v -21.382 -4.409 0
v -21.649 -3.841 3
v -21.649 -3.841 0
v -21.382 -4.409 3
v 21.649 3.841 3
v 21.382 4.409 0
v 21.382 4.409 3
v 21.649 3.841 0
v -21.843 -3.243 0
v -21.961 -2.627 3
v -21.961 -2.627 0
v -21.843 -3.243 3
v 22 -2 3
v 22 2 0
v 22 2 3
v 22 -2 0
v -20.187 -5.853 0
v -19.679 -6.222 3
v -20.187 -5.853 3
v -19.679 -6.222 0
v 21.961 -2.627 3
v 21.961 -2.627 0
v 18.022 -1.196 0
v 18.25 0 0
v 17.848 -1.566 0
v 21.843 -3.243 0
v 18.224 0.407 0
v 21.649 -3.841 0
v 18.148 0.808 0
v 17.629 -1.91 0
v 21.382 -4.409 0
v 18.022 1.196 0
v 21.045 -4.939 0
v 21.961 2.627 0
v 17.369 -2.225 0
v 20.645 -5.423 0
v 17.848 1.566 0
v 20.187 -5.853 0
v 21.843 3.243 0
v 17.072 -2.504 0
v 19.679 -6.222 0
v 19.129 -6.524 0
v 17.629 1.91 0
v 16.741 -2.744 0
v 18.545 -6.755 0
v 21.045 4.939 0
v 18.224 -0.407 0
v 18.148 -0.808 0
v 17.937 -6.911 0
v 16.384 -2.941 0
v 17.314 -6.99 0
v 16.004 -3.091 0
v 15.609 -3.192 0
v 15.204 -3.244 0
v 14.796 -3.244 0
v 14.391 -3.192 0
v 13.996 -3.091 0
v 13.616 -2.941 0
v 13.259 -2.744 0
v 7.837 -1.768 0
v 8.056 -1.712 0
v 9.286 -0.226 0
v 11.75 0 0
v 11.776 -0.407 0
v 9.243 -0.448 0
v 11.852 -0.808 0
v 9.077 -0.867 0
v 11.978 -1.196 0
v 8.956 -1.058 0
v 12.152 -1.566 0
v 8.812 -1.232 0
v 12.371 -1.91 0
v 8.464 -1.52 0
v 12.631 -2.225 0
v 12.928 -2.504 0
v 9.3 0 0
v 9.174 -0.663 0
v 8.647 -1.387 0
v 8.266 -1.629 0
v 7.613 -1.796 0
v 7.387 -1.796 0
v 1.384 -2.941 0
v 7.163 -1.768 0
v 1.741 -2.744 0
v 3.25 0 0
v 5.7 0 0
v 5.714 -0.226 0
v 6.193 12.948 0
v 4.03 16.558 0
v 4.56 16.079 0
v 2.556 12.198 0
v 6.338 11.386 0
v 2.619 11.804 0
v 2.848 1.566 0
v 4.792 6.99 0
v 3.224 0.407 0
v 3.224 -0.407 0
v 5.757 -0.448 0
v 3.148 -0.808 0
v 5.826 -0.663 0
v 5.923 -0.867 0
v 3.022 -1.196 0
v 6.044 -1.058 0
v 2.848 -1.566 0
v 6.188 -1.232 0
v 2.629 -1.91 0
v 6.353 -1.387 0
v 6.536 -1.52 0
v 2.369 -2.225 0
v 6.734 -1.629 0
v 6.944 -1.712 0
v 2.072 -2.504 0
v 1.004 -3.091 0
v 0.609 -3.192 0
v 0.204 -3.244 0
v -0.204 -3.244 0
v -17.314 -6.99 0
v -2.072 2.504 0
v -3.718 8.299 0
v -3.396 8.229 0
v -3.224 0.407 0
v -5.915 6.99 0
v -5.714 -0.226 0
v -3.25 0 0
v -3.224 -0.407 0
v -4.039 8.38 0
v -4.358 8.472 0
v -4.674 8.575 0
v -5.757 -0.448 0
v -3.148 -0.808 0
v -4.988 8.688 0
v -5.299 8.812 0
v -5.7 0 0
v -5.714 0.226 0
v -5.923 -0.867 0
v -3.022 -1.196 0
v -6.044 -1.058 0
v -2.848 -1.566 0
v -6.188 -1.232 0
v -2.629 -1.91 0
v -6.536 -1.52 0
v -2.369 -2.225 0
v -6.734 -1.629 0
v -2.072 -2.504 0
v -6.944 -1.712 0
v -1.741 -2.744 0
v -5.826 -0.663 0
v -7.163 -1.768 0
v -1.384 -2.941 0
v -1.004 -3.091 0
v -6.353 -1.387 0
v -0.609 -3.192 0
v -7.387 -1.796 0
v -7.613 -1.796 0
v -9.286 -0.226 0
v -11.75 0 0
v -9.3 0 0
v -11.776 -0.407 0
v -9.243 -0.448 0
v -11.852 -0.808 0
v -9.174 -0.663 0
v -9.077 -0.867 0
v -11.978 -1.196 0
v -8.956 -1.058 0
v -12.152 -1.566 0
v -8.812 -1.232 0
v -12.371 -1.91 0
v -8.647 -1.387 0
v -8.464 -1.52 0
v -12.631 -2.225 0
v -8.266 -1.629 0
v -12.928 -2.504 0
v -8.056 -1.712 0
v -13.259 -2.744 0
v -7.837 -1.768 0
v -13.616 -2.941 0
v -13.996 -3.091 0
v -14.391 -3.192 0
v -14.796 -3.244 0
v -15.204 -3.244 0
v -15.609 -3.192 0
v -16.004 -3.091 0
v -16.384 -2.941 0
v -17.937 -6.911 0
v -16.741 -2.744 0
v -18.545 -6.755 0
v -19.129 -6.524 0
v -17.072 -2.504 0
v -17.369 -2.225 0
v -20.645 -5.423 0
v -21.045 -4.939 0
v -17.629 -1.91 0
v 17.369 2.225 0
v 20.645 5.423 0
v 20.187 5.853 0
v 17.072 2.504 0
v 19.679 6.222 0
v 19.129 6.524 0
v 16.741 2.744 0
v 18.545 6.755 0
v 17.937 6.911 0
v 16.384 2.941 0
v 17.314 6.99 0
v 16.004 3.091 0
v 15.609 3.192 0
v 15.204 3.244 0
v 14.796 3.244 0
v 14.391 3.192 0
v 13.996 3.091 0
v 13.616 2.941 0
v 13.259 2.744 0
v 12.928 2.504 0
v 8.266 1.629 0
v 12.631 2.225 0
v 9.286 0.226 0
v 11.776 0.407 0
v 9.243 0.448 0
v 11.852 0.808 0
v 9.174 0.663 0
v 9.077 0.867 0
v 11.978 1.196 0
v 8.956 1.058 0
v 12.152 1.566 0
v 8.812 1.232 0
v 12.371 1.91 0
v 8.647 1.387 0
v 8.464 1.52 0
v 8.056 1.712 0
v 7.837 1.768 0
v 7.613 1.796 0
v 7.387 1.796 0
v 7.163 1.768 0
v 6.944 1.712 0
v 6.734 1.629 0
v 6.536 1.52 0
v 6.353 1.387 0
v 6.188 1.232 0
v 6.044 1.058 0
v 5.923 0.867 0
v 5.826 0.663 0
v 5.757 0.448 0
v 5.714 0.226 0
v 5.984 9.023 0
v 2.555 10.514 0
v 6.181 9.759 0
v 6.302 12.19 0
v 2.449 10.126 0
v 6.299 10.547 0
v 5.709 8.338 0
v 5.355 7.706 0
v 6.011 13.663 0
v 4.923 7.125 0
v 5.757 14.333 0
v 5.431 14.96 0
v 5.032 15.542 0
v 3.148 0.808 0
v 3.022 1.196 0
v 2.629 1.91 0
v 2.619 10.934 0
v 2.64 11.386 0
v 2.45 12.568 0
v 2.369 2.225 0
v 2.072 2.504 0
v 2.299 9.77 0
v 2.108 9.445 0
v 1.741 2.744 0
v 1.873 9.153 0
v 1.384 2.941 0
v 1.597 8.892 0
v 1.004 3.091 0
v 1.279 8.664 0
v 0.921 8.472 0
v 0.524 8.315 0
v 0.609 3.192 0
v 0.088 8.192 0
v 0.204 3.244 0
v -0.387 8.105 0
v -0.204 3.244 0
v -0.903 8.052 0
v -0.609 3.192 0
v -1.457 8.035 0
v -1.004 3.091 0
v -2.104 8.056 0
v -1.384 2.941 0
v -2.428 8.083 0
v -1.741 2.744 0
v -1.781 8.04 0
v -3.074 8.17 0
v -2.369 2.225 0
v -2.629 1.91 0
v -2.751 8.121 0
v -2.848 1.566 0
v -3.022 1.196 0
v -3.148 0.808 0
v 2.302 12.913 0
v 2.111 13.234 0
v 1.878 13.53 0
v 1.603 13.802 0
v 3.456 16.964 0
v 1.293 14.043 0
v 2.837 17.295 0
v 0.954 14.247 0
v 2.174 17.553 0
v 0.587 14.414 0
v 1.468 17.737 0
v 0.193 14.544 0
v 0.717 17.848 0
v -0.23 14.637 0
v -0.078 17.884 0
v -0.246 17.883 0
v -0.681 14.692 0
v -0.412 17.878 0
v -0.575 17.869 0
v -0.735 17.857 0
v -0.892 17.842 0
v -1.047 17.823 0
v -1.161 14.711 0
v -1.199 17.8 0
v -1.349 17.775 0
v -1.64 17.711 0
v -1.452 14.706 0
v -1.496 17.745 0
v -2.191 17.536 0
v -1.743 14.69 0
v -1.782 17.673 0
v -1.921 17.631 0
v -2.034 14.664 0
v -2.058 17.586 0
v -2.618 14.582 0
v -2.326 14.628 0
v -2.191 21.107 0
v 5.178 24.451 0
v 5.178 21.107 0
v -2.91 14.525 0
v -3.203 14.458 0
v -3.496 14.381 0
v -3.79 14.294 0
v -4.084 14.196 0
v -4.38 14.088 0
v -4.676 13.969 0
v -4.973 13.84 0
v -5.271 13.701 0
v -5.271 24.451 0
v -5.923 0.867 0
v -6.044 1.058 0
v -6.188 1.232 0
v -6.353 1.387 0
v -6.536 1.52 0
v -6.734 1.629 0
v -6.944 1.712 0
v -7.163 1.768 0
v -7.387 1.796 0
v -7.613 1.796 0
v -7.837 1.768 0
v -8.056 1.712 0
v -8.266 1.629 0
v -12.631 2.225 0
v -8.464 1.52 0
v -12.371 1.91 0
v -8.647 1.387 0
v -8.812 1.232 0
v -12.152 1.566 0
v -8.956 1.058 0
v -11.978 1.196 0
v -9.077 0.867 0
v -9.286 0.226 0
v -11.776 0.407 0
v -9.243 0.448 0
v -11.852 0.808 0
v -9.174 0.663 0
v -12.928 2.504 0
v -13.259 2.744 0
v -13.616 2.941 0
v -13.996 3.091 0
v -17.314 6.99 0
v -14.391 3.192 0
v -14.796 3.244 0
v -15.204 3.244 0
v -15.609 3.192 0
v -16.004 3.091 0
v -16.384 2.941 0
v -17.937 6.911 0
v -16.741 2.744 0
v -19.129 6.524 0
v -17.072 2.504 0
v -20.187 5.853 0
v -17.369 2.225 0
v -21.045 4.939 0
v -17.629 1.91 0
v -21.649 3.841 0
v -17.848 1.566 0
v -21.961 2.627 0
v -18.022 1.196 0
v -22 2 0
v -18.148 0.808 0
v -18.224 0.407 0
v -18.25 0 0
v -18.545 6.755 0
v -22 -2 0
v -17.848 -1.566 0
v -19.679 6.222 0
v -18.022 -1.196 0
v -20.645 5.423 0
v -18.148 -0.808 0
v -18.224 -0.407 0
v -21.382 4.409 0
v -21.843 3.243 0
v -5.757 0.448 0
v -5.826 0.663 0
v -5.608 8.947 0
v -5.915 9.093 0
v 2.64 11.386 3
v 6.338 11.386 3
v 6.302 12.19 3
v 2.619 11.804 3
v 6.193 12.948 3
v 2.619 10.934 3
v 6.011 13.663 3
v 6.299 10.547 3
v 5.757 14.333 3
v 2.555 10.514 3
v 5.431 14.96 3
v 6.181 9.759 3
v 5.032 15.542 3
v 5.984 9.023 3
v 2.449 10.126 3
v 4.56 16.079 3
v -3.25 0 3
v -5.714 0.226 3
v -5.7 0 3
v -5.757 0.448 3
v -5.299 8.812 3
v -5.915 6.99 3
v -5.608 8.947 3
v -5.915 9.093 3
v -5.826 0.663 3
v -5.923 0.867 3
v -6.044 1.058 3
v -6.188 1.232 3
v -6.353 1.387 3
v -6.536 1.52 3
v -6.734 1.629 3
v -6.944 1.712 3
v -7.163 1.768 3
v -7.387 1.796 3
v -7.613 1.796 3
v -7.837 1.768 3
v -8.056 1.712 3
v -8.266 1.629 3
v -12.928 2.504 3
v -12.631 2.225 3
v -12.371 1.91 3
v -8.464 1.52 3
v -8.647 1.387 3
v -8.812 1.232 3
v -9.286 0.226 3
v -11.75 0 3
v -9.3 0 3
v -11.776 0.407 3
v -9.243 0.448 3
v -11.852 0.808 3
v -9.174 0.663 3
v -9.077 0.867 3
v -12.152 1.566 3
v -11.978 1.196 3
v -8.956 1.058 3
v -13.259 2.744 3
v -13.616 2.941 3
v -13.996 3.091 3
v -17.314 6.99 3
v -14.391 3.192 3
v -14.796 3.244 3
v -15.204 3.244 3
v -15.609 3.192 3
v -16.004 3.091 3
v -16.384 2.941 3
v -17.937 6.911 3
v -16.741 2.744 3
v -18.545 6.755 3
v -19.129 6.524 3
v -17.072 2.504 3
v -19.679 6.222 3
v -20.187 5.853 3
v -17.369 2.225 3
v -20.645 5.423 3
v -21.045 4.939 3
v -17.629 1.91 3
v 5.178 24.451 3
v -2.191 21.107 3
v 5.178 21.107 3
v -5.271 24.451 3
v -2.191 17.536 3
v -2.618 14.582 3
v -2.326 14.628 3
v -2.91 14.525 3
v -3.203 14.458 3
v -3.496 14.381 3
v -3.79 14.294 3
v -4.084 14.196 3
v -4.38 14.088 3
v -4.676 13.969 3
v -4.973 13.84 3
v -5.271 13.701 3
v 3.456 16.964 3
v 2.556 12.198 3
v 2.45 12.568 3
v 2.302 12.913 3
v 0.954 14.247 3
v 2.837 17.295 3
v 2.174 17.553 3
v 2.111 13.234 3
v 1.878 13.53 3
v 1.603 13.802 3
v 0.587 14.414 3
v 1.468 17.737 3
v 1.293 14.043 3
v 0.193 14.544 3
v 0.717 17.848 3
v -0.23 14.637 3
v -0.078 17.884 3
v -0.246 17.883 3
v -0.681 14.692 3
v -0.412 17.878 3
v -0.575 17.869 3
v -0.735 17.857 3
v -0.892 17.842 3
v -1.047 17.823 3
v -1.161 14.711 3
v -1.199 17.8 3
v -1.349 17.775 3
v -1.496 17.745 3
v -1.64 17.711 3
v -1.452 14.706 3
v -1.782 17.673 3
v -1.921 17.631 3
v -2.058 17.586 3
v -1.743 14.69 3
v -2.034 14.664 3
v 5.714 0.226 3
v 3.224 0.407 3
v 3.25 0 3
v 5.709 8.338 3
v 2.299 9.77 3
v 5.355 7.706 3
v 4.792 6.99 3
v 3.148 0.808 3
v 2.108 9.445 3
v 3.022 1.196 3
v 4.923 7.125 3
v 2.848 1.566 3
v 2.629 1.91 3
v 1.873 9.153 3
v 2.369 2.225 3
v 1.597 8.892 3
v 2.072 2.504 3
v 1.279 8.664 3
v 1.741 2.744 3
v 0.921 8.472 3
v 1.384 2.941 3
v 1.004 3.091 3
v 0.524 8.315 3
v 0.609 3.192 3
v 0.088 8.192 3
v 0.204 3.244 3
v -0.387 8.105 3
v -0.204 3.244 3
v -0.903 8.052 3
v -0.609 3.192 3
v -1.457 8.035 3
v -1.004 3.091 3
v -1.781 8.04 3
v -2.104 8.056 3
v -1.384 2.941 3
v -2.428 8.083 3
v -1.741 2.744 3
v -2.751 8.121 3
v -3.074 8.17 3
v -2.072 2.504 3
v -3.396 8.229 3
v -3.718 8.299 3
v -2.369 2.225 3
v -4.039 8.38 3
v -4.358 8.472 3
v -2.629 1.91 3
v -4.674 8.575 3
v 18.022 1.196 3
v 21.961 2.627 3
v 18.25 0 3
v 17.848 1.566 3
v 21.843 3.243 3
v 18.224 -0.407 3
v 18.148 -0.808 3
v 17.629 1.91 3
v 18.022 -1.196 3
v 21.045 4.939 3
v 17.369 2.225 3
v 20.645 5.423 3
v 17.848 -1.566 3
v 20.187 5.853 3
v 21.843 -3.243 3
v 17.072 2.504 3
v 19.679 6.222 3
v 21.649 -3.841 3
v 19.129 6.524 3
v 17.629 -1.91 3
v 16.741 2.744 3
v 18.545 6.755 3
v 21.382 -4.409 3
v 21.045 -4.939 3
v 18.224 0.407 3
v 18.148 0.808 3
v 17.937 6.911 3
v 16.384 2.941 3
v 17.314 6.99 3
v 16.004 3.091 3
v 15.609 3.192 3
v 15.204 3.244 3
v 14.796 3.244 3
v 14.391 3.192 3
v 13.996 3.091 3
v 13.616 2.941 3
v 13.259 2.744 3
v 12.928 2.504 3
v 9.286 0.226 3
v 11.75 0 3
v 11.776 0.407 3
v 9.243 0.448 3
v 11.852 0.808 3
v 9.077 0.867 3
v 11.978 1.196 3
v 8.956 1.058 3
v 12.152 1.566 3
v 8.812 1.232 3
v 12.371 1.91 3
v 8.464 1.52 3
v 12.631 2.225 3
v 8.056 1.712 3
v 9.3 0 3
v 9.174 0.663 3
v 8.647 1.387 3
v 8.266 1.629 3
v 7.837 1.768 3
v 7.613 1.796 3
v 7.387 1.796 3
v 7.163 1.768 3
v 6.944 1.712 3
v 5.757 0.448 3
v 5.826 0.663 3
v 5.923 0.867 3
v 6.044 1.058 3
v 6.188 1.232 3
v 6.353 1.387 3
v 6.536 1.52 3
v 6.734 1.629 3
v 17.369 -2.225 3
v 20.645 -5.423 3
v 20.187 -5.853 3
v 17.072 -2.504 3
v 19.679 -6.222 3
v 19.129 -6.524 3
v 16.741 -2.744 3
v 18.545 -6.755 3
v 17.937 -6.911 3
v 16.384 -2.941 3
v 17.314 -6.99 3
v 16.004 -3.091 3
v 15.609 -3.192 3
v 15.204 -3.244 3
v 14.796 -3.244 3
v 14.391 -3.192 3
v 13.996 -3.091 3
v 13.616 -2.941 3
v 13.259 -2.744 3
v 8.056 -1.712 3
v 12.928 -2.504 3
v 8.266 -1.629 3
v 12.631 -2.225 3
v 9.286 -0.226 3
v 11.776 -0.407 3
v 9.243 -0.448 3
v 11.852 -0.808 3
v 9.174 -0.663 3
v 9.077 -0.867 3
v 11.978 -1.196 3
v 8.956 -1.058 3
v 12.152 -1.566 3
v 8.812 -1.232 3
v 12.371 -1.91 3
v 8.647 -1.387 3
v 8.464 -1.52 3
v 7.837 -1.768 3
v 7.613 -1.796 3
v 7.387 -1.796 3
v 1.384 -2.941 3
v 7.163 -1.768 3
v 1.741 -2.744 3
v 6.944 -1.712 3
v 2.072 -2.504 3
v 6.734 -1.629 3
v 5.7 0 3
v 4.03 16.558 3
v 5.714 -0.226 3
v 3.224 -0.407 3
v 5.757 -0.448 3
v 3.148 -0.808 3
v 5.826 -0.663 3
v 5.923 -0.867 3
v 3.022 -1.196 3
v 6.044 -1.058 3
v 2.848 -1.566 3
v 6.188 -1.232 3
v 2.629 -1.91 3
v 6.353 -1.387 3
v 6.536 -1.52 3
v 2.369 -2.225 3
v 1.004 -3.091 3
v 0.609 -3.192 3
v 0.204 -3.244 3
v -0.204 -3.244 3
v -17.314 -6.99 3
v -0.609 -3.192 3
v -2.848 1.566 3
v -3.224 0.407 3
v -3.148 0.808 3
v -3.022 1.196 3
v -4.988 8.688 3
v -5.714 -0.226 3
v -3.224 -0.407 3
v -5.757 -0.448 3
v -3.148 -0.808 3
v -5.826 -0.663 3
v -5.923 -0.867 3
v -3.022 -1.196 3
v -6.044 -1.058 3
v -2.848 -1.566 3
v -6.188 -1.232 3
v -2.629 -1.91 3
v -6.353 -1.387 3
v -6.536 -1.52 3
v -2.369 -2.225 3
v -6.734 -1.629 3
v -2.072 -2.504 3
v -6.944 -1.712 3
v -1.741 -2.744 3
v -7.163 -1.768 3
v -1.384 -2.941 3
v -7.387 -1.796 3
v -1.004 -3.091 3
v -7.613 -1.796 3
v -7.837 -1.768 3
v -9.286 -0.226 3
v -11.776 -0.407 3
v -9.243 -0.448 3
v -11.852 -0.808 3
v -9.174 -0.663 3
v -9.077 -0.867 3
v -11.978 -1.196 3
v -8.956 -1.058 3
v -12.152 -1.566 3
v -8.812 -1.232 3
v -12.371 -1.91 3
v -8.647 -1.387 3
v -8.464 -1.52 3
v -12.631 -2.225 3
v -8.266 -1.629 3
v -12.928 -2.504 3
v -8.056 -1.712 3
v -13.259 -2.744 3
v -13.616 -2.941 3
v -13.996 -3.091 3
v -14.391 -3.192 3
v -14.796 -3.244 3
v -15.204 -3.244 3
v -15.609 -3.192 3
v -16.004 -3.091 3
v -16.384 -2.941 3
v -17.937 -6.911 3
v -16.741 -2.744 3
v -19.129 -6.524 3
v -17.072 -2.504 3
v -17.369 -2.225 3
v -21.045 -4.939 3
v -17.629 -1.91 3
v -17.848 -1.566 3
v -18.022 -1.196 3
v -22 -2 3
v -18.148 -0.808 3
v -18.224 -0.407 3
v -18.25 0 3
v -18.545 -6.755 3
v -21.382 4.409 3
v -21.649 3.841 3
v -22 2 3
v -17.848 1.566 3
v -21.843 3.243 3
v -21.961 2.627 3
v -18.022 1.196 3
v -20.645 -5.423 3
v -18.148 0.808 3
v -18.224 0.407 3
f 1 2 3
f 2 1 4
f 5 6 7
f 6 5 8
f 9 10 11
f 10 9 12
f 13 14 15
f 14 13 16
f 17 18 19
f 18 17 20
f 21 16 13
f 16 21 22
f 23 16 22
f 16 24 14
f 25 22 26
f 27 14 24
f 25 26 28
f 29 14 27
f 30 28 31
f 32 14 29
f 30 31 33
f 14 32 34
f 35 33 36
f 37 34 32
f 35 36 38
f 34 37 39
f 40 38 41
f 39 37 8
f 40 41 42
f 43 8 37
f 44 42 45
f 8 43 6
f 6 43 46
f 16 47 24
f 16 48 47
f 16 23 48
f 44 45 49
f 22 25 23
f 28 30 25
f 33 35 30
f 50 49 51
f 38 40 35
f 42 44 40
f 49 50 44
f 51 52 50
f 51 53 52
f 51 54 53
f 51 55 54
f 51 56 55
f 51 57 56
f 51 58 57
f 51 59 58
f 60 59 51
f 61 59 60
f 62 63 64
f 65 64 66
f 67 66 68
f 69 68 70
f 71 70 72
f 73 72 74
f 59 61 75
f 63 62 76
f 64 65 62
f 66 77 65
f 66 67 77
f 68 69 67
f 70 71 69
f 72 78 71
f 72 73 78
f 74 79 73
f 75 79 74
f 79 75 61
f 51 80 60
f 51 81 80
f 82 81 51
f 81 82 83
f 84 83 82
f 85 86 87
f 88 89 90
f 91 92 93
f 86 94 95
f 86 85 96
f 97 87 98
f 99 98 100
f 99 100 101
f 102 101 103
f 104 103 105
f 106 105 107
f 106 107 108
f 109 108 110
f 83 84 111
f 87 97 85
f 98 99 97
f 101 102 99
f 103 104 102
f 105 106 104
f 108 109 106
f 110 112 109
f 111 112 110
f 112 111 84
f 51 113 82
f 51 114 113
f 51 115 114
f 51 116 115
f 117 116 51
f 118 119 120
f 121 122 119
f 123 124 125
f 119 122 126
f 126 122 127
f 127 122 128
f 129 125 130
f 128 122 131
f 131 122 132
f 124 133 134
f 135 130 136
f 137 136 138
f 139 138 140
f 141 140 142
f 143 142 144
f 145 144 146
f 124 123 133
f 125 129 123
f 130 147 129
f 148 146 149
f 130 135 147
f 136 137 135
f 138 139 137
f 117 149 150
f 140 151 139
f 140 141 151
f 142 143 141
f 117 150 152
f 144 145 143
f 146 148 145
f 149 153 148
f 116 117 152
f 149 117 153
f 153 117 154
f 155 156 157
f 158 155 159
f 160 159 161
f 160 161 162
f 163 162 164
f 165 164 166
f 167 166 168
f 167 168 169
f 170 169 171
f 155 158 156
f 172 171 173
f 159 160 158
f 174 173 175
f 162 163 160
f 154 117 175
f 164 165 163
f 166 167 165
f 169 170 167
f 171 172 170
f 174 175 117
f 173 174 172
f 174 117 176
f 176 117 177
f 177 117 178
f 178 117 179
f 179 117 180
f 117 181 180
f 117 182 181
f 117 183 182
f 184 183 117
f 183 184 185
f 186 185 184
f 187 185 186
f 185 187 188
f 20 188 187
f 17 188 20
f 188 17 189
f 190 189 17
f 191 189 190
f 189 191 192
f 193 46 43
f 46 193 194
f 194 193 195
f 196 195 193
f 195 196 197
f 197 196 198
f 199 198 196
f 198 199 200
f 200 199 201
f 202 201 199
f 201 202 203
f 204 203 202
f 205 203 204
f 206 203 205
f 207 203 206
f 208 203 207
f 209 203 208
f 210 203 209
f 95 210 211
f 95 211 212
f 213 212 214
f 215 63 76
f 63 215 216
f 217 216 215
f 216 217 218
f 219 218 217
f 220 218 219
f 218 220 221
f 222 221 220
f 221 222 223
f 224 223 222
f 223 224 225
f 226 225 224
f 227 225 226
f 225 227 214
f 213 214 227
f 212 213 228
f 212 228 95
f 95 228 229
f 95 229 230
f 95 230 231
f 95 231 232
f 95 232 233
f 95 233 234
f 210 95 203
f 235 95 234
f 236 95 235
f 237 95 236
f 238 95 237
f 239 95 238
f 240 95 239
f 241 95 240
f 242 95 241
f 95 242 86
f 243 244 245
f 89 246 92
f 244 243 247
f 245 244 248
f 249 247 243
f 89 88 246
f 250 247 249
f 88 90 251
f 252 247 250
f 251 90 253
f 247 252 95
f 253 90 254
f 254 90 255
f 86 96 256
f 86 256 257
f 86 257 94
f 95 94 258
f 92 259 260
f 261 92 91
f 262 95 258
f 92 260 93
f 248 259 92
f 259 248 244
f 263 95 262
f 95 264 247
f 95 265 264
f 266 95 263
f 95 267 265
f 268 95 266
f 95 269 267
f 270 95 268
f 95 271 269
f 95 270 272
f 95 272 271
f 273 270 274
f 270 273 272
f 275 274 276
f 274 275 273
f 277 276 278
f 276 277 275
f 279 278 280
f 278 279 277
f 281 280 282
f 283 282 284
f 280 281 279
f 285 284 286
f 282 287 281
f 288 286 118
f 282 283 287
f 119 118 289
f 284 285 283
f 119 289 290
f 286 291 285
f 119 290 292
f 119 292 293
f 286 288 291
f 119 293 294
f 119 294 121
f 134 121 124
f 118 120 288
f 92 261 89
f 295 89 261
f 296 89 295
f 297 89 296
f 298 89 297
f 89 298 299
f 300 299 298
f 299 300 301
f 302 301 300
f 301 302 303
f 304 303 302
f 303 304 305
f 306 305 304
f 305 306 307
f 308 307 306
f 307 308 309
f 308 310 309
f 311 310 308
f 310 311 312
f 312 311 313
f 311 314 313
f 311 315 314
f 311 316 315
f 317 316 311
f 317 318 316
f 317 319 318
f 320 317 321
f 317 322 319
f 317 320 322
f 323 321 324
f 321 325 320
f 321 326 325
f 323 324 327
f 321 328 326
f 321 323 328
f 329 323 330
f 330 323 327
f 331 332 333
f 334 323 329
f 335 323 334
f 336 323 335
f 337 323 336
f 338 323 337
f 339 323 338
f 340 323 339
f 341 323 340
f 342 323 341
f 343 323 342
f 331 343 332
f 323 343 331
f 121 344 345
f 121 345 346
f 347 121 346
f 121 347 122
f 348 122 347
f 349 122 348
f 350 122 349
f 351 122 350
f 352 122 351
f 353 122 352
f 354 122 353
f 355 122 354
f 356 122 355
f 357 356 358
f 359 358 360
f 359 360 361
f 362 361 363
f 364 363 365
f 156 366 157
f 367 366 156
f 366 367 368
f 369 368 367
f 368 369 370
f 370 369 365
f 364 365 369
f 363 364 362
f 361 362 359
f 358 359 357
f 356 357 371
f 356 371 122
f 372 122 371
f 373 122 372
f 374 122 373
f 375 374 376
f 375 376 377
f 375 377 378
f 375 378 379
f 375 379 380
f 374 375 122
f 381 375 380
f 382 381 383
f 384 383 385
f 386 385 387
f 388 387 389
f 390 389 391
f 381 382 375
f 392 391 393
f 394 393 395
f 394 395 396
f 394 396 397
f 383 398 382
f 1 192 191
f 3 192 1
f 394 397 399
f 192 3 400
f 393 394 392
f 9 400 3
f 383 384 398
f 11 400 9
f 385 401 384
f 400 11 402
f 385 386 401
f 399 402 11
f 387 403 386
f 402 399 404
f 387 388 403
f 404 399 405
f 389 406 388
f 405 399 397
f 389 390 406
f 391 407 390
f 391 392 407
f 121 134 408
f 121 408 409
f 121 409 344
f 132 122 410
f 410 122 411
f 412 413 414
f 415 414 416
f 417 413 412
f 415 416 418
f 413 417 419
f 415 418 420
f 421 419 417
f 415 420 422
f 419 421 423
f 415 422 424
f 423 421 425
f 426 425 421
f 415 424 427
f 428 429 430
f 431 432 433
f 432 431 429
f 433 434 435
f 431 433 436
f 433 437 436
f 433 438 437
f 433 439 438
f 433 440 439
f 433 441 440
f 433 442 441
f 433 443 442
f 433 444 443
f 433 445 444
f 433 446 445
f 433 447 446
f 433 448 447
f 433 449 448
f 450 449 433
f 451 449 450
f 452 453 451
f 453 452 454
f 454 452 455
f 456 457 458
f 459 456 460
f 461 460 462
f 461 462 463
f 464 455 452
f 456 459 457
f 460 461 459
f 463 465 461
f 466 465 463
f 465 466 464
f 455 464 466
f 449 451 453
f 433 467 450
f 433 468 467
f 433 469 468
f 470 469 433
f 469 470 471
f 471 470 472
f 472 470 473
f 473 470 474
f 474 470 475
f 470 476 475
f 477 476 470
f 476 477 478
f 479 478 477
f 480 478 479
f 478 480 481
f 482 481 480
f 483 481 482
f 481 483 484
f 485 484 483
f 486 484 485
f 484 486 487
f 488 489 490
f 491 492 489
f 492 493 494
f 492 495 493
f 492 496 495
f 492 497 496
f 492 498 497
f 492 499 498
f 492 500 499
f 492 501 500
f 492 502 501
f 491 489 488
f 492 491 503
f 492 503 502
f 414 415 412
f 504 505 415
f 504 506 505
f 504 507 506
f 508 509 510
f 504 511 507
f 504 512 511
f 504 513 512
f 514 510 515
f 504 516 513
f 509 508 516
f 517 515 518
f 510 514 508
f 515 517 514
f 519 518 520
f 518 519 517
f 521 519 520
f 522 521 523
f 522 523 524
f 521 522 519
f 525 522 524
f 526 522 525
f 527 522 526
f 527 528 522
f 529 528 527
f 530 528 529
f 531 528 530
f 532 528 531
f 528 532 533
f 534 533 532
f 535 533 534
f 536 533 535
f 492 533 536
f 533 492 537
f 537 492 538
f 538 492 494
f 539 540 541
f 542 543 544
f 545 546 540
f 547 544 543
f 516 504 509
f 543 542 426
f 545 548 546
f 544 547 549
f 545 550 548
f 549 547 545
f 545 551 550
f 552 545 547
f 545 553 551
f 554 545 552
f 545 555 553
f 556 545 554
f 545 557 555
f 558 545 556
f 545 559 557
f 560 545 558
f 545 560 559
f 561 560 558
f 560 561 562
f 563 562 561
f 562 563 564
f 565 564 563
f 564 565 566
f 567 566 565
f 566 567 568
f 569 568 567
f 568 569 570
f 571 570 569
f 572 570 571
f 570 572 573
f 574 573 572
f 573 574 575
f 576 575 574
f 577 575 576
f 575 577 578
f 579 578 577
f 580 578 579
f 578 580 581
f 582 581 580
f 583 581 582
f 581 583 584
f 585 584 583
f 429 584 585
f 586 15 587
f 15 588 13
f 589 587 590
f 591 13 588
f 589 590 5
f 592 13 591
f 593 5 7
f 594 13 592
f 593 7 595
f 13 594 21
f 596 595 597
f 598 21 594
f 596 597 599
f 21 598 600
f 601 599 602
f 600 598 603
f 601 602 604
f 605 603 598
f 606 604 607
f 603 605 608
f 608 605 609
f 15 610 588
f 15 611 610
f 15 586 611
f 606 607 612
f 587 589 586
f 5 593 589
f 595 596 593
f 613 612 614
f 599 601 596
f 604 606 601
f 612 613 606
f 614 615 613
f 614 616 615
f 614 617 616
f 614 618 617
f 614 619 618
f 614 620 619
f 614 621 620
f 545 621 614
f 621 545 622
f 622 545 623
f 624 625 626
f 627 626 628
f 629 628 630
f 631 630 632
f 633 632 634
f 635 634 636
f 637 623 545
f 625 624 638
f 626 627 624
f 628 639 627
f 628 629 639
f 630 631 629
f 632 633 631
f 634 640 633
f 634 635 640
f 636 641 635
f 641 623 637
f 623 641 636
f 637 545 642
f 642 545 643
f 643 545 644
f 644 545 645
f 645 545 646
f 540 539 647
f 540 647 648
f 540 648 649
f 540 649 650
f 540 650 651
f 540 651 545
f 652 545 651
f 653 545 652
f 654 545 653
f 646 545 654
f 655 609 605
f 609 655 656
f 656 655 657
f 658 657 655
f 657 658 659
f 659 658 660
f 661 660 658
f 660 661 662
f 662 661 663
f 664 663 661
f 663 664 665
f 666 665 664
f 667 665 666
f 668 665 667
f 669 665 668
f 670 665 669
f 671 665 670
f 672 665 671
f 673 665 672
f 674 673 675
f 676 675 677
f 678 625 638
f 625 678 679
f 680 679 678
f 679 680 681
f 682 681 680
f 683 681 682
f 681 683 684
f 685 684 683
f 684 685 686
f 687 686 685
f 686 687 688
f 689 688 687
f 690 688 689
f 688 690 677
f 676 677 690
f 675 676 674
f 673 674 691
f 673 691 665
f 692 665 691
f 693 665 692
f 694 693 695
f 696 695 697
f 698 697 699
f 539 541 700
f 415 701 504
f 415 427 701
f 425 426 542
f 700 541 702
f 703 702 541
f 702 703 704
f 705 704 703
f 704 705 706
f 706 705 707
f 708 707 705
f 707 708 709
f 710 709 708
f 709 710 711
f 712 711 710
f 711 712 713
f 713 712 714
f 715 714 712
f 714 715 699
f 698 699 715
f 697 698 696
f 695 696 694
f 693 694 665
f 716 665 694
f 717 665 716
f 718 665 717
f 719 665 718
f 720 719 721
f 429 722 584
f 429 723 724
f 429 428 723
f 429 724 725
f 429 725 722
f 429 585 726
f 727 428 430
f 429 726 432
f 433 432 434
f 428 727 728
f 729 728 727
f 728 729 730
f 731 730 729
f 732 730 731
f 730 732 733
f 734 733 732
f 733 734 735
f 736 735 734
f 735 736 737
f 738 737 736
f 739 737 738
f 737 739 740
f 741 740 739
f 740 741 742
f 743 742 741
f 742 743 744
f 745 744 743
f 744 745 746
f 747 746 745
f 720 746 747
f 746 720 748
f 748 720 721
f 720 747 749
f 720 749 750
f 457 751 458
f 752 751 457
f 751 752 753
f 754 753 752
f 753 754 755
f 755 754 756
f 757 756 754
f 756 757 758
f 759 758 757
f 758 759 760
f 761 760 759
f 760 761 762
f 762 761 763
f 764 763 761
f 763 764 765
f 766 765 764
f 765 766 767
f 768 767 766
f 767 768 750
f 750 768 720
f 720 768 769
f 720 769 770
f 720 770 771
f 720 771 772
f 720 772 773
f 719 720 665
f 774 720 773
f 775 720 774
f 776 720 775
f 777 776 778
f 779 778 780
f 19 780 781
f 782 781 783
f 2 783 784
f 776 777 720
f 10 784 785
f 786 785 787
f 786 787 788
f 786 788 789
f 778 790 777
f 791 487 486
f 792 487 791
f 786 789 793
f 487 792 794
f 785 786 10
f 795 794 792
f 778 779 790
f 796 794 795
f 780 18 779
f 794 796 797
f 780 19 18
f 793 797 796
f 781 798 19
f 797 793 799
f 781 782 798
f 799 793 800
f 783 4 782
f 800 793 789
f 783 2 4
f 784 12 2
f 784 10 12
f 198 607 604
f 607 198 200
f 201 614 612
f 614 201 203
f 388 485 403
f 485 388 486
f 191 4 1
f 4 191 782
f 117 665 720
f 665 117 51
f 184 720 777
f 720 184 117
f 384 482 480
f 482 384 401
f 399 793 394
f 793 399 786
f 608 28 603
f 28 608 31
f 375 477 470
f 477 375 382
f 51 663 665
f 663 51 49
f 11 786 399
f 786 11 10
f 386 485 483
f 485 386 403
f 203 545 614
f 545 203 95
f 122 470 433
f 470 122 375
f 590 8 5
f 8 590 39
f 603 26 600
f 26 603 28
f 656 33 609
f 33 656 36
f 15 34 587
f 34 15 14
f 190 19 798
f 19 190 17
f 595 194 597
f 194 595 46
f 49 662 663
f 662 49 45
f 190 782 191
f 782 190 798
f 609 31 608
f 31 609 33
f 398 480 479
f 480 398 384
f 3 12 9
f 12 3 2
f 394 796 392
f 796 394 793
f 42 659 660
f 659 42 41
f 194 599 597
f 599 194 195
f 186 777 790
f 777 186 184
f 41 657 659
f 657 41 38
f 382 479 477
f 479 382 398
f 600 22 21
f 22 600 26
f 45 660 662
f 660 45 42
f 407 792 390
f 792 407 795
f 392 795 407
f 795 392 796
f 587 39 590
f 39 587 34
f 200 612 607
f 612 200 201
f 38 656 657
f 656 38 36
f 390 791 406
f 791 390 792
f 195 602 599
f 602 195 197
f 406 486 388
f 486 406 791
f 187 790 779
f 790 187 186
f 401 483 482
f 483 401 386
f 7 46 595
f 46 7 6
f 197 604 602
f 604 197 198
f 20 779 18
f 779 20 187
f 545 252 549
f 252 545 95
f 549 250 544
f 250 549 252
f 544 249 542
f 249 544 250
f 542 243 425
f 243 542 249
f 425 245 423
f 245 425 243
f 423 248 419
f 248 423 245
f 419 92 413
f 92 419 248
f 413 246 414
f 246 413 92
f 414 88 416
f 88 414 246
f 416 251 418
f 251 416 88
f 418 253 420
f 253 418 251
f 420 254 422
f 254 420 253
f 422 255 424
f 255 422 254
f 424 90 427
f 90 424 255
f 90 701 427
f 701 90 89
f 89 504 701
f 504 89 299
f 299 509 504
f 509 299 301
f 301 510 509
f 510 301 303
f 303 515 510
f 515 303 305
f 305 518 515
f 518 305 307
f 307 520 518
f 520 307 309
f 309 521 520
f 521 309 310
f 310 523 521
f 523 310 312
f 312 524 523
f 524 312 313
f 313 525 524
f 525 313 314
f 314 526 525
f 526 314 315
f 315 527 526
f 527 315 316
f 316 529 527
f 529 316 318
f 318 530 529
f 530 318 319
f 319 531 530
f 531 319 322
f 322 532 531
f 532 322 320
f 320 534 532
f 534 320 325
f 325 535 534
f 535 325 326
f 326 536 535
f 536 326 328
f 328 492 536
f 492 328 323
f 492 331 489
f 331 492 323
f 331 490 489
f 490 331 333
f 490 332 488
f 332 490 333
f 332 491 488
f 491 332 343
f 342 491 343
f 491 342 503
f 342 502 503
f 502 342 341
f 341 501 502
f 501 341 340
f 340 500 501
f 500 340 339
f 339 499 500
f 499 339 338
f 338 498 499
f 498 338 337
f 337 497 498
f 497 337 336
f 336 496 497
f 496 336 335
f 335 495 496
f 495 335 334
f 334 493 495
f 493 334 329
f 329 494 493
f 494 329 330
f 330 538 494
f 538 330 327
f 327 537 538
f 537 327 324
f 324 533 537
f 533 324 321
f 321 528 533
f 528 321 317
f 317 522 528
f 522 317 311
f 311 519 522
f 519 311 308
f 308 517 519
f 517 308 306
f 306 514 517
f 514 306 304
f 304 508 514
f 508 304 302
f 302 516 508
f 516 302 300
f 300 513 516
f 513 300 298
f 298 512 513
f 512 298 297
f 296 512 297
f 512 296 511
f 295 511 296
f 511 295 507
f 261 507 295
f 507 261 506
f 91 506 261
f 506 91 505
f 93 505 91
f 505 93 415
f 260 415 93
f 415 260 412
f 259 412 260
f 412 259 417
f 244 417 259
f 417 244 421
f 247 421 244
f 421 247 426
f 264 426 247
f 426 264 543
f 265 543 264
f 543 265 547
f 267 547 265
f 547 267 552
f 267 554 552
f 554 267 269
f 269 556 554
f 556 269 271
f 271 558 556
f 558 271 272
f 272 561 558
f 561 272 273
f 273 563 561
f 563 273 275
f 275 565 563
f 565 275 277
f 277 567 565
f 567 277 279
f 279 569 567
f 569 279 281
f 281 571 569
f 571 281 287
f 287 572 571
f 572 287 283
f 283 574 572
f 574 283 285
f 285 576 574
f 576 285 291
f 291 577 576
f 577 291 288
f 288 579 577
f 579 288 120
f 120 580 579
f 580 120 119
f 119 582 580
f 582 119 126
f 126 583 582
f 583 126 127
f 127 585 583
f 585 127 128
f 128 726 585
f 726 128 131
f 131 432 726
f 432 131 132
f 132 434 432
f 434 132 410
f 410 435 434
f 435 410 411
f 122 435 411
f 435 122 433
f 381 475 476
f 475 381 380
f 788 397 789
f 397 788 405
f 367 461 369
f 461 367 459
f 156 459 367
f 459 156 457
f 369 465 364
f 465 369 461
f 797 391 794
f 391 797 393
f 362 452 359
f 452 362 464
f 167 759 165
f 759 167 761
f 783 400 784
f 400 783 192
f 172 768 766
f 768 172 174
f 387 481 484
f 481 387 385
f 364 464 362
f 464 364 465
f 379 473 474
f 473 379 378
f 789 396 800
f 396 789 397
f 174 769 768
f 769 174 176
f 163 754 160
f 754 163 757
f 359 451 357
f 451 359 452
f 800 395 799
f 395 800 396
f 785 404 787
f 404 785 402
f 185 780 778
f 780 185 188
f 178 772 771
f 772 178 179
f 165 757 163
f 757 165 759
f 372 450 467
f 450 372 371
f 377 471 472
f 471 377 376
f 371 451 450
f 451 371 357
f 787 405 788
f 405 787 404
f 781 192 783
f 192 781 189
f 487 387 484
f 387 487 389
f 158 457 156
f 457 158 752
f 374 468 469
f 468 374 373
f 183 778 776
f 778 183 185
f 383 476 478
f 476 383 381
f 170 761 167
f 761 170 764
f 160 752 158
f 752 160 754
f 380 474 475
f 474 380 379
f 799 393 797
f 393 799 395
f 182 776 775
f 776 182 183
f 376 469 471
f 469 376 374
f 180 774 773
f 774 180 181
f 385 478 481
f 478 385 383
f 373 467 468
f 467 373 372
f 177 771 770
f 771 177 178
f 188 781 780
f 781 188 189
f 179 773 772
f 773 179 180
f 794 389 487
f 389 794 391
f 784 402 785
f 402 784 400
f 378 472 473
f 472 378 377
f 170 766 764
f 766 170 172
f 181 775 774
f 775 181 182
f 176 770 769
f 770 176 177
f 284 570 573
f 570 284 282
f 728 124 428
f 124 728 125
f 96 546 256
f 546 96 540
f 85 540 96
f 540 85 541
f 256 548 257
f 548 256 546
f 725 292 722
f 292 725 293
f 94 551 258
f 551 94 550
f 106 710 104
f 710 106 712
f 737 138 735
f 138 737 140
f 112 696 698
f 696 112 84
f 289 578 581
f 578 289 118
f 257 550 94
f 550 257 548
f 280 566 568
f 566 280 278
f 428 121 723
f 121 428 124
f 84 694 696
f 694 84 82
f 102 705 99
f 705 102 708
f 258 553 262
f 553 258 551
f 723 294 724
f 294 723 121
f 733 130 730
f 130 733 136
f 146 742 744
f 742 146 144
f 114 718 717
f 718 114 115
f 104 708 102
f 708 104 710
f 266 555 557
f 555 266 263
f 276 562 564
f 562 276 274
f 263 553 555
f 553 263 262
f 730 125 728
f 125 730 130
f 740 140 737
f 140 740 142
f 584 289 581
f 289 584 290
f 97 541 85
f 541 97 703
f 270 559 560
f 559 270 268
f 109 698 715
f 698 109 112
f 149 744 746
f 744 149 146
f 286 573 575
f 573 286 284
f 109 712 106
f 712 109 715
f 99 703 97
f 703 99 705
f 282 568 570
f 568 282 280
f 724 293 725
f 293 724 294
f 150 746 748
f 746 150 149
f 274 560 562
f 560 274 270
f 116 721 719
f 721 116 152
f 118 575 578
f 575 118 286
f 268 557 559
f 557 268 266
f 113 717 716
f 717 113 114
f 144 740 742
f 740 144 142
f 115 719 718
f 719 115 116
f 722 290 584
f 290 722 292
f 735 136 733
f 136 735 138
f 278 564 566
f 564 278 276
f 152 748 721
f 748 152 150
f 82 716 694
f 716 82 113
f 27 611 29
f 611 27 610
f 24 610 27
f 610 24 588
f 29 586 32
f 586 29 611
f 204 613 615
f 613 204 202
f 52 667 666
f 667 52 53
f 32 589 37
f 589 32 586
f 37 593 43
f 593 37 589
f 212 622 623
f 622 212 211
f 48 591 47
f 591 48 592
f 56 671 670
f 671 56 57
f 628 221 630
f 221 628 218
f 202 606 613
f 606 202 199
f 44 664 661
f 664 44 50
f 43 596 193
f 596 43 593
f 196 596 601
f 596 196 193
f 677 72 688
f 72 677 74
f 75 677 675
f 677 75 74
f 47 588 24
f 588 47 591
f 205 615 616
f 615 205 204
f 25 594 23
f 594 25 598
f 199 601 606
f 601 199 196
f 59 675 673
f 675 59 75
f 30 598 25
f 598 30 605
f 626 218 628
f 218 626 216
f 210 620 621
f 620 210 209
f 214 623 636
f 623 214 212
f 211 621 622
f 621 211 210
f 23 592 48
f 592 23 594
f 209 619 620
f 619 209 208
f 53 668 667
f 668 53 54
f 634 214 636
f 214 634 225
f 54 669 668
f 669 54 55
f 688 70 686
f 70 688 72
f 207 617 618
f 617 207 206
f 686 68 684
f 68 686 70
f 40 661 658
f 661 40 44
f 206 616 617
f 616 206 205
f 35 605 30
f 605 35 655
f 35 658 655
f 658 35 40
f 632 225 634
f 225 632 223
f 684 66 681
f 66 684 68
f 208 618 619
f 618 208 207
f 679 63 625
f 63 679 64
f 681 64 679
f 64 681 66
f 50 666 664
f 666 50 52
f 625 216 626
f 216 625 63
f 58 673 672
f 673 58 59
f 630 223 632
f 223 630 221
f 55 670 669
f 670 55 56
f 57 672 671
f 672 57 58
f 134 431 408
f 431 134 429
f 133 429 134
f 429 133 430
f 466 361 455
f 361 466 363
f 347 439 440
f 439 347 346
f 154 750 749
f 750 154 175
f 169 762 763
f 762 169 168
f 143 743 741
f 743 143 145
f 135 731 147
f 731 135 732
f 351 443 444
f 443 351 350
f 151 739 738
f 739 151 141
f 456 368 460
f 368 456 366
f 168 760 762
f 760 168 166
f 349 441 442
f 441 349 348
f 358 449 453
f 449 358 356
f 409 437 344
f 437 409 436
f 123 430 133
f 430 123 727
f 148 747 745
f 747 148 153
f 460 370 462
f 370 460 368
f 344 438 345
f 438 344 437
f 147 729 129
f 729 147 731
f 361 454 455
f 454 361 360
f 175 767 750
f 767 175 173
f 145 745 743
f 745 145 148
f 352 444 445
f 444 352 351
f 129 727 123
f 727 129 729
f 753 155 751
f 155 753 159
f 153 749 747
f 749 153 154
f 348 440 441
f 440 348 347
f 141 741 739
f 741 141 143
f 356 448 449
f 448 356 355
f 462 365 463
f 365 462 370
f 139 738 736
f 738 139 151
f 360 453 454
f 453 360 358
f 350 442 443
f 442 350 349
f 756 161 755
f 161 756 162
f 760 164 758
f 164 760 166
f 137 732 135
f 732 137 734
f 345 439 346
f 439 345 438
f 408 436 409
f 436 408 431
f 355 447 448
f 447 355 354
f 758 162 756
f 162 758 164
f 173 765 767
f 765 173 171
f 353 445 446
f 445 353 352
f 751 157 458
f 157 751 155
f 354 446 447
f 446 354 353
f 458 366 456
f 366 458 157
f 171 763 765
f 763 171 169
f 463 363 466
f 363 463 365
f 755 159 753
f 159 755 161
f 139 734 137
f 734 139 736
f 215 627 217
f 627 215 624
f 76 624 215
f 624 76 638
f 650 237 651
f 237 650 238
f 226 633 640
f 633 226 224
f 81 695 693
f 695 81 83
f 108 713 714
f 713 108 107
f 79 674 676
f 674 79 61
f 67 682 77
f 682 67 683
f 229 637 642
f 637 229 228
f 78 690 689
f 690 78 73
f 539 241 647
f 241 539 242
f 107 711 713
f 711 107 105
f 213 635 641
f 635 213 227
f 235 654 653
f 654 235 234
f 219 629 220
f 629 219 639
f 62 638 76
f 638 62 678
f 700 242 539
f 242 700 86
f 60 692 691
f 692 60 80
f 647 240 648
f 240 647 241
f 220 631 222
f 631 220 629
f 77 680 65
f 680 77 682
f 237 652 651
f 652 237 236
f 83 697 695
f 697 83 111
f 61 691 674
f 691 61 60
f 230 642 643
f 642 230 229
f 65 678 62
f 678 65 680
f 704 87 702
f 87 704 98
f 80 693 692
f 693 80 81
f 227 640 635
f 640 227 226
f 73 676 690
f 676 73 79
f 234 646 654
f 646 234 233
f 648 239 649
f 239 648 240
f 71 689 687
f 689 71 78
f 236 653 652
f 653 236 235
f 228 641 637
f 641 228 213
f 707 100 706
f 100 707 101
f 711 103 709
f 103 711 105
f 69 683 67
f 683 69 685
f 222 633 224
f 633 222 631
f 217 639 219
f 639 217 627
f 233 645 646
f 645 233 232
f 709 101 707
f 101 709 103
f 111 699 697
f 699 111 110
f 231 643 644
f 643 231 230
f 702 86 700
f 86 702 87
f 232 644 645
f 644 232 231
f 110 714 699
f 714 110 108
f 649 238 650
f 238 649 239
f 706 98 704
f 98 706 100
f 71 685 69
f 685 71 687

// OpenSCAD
$fn = 50;


difference() {
	union() {
		hull() {
			translate(v = [-17.0000000000, 2.0000000000, 0]) {
				cylinder(h = 3, r = 5);
			}
			translate(v = [17.0000000000, 2.0000000000, 0]) {
				cylinder(h = 3, r = 5);
			}
			translate(v = [-17.0000000000, -2.0000000000, 0]) {
				cylinder(h = 3, r = 5);
			}
			translate(v = [17.0000000000, -2.0000000000, 0]) {
				cylinder(h = 3, r = 5);
			}
		}
		translate(v = [0, 24, 0]) {
			linear_extrude(height = 3) {
				text(font = "DejaVu Sans Mono:style=Bold", halign = "center", size = 19.0000000000, text = "5", valign = "top");
			}
		}
	}
	union() {
		translate(v = [-15.0000000000, 0.0000000000, 0]) {
			translate(v = [0, 0, -100]) {
				cylinder(h = 200, r = 3.2500000000);
			}
		}
		translate(v = [0, 0, -100]) {
			cylinder(h = 200, r = 3.2500000000);
		}
		translate(v = [15.0000000000, 0.0000000000, 0]) {
			translate(v = [0, 0, -100]) {
				cylinder(h = 200, r = 3.2500000000);
			}
		}
		translate(v = [-15.0000000000, 0.0000000000, 0]) {
			translate(v = [0, 0, -100]) {
				cylinder(h = 200, r = 1.8000000000);
			}
		}
		translate(v = [-7.5000000000, 0.0000000000, 0]) {
			translate(v = [0, 0, -100]) {
				cylinder(h = 200, r = 1.8000000000);
			}
		}
		translate(v = [0, 0, -100]) {
			cylinder(h = 200, r = 1.8000000000);
		}
		translate(v = [7.5000000000, 0.0000000000, 0]) {
			translate(v = [0, 0, -100]) {
				cylinder(h = 200, r = 1.8000000000);
			}
		}
		translate(v = [15.0000000000, 0.0000000000, 0]) {
			translate(v = [0, 0, -100]) {
				cylinder(h = 200, r = 1.8000000000);
			}
		}
	}
}
